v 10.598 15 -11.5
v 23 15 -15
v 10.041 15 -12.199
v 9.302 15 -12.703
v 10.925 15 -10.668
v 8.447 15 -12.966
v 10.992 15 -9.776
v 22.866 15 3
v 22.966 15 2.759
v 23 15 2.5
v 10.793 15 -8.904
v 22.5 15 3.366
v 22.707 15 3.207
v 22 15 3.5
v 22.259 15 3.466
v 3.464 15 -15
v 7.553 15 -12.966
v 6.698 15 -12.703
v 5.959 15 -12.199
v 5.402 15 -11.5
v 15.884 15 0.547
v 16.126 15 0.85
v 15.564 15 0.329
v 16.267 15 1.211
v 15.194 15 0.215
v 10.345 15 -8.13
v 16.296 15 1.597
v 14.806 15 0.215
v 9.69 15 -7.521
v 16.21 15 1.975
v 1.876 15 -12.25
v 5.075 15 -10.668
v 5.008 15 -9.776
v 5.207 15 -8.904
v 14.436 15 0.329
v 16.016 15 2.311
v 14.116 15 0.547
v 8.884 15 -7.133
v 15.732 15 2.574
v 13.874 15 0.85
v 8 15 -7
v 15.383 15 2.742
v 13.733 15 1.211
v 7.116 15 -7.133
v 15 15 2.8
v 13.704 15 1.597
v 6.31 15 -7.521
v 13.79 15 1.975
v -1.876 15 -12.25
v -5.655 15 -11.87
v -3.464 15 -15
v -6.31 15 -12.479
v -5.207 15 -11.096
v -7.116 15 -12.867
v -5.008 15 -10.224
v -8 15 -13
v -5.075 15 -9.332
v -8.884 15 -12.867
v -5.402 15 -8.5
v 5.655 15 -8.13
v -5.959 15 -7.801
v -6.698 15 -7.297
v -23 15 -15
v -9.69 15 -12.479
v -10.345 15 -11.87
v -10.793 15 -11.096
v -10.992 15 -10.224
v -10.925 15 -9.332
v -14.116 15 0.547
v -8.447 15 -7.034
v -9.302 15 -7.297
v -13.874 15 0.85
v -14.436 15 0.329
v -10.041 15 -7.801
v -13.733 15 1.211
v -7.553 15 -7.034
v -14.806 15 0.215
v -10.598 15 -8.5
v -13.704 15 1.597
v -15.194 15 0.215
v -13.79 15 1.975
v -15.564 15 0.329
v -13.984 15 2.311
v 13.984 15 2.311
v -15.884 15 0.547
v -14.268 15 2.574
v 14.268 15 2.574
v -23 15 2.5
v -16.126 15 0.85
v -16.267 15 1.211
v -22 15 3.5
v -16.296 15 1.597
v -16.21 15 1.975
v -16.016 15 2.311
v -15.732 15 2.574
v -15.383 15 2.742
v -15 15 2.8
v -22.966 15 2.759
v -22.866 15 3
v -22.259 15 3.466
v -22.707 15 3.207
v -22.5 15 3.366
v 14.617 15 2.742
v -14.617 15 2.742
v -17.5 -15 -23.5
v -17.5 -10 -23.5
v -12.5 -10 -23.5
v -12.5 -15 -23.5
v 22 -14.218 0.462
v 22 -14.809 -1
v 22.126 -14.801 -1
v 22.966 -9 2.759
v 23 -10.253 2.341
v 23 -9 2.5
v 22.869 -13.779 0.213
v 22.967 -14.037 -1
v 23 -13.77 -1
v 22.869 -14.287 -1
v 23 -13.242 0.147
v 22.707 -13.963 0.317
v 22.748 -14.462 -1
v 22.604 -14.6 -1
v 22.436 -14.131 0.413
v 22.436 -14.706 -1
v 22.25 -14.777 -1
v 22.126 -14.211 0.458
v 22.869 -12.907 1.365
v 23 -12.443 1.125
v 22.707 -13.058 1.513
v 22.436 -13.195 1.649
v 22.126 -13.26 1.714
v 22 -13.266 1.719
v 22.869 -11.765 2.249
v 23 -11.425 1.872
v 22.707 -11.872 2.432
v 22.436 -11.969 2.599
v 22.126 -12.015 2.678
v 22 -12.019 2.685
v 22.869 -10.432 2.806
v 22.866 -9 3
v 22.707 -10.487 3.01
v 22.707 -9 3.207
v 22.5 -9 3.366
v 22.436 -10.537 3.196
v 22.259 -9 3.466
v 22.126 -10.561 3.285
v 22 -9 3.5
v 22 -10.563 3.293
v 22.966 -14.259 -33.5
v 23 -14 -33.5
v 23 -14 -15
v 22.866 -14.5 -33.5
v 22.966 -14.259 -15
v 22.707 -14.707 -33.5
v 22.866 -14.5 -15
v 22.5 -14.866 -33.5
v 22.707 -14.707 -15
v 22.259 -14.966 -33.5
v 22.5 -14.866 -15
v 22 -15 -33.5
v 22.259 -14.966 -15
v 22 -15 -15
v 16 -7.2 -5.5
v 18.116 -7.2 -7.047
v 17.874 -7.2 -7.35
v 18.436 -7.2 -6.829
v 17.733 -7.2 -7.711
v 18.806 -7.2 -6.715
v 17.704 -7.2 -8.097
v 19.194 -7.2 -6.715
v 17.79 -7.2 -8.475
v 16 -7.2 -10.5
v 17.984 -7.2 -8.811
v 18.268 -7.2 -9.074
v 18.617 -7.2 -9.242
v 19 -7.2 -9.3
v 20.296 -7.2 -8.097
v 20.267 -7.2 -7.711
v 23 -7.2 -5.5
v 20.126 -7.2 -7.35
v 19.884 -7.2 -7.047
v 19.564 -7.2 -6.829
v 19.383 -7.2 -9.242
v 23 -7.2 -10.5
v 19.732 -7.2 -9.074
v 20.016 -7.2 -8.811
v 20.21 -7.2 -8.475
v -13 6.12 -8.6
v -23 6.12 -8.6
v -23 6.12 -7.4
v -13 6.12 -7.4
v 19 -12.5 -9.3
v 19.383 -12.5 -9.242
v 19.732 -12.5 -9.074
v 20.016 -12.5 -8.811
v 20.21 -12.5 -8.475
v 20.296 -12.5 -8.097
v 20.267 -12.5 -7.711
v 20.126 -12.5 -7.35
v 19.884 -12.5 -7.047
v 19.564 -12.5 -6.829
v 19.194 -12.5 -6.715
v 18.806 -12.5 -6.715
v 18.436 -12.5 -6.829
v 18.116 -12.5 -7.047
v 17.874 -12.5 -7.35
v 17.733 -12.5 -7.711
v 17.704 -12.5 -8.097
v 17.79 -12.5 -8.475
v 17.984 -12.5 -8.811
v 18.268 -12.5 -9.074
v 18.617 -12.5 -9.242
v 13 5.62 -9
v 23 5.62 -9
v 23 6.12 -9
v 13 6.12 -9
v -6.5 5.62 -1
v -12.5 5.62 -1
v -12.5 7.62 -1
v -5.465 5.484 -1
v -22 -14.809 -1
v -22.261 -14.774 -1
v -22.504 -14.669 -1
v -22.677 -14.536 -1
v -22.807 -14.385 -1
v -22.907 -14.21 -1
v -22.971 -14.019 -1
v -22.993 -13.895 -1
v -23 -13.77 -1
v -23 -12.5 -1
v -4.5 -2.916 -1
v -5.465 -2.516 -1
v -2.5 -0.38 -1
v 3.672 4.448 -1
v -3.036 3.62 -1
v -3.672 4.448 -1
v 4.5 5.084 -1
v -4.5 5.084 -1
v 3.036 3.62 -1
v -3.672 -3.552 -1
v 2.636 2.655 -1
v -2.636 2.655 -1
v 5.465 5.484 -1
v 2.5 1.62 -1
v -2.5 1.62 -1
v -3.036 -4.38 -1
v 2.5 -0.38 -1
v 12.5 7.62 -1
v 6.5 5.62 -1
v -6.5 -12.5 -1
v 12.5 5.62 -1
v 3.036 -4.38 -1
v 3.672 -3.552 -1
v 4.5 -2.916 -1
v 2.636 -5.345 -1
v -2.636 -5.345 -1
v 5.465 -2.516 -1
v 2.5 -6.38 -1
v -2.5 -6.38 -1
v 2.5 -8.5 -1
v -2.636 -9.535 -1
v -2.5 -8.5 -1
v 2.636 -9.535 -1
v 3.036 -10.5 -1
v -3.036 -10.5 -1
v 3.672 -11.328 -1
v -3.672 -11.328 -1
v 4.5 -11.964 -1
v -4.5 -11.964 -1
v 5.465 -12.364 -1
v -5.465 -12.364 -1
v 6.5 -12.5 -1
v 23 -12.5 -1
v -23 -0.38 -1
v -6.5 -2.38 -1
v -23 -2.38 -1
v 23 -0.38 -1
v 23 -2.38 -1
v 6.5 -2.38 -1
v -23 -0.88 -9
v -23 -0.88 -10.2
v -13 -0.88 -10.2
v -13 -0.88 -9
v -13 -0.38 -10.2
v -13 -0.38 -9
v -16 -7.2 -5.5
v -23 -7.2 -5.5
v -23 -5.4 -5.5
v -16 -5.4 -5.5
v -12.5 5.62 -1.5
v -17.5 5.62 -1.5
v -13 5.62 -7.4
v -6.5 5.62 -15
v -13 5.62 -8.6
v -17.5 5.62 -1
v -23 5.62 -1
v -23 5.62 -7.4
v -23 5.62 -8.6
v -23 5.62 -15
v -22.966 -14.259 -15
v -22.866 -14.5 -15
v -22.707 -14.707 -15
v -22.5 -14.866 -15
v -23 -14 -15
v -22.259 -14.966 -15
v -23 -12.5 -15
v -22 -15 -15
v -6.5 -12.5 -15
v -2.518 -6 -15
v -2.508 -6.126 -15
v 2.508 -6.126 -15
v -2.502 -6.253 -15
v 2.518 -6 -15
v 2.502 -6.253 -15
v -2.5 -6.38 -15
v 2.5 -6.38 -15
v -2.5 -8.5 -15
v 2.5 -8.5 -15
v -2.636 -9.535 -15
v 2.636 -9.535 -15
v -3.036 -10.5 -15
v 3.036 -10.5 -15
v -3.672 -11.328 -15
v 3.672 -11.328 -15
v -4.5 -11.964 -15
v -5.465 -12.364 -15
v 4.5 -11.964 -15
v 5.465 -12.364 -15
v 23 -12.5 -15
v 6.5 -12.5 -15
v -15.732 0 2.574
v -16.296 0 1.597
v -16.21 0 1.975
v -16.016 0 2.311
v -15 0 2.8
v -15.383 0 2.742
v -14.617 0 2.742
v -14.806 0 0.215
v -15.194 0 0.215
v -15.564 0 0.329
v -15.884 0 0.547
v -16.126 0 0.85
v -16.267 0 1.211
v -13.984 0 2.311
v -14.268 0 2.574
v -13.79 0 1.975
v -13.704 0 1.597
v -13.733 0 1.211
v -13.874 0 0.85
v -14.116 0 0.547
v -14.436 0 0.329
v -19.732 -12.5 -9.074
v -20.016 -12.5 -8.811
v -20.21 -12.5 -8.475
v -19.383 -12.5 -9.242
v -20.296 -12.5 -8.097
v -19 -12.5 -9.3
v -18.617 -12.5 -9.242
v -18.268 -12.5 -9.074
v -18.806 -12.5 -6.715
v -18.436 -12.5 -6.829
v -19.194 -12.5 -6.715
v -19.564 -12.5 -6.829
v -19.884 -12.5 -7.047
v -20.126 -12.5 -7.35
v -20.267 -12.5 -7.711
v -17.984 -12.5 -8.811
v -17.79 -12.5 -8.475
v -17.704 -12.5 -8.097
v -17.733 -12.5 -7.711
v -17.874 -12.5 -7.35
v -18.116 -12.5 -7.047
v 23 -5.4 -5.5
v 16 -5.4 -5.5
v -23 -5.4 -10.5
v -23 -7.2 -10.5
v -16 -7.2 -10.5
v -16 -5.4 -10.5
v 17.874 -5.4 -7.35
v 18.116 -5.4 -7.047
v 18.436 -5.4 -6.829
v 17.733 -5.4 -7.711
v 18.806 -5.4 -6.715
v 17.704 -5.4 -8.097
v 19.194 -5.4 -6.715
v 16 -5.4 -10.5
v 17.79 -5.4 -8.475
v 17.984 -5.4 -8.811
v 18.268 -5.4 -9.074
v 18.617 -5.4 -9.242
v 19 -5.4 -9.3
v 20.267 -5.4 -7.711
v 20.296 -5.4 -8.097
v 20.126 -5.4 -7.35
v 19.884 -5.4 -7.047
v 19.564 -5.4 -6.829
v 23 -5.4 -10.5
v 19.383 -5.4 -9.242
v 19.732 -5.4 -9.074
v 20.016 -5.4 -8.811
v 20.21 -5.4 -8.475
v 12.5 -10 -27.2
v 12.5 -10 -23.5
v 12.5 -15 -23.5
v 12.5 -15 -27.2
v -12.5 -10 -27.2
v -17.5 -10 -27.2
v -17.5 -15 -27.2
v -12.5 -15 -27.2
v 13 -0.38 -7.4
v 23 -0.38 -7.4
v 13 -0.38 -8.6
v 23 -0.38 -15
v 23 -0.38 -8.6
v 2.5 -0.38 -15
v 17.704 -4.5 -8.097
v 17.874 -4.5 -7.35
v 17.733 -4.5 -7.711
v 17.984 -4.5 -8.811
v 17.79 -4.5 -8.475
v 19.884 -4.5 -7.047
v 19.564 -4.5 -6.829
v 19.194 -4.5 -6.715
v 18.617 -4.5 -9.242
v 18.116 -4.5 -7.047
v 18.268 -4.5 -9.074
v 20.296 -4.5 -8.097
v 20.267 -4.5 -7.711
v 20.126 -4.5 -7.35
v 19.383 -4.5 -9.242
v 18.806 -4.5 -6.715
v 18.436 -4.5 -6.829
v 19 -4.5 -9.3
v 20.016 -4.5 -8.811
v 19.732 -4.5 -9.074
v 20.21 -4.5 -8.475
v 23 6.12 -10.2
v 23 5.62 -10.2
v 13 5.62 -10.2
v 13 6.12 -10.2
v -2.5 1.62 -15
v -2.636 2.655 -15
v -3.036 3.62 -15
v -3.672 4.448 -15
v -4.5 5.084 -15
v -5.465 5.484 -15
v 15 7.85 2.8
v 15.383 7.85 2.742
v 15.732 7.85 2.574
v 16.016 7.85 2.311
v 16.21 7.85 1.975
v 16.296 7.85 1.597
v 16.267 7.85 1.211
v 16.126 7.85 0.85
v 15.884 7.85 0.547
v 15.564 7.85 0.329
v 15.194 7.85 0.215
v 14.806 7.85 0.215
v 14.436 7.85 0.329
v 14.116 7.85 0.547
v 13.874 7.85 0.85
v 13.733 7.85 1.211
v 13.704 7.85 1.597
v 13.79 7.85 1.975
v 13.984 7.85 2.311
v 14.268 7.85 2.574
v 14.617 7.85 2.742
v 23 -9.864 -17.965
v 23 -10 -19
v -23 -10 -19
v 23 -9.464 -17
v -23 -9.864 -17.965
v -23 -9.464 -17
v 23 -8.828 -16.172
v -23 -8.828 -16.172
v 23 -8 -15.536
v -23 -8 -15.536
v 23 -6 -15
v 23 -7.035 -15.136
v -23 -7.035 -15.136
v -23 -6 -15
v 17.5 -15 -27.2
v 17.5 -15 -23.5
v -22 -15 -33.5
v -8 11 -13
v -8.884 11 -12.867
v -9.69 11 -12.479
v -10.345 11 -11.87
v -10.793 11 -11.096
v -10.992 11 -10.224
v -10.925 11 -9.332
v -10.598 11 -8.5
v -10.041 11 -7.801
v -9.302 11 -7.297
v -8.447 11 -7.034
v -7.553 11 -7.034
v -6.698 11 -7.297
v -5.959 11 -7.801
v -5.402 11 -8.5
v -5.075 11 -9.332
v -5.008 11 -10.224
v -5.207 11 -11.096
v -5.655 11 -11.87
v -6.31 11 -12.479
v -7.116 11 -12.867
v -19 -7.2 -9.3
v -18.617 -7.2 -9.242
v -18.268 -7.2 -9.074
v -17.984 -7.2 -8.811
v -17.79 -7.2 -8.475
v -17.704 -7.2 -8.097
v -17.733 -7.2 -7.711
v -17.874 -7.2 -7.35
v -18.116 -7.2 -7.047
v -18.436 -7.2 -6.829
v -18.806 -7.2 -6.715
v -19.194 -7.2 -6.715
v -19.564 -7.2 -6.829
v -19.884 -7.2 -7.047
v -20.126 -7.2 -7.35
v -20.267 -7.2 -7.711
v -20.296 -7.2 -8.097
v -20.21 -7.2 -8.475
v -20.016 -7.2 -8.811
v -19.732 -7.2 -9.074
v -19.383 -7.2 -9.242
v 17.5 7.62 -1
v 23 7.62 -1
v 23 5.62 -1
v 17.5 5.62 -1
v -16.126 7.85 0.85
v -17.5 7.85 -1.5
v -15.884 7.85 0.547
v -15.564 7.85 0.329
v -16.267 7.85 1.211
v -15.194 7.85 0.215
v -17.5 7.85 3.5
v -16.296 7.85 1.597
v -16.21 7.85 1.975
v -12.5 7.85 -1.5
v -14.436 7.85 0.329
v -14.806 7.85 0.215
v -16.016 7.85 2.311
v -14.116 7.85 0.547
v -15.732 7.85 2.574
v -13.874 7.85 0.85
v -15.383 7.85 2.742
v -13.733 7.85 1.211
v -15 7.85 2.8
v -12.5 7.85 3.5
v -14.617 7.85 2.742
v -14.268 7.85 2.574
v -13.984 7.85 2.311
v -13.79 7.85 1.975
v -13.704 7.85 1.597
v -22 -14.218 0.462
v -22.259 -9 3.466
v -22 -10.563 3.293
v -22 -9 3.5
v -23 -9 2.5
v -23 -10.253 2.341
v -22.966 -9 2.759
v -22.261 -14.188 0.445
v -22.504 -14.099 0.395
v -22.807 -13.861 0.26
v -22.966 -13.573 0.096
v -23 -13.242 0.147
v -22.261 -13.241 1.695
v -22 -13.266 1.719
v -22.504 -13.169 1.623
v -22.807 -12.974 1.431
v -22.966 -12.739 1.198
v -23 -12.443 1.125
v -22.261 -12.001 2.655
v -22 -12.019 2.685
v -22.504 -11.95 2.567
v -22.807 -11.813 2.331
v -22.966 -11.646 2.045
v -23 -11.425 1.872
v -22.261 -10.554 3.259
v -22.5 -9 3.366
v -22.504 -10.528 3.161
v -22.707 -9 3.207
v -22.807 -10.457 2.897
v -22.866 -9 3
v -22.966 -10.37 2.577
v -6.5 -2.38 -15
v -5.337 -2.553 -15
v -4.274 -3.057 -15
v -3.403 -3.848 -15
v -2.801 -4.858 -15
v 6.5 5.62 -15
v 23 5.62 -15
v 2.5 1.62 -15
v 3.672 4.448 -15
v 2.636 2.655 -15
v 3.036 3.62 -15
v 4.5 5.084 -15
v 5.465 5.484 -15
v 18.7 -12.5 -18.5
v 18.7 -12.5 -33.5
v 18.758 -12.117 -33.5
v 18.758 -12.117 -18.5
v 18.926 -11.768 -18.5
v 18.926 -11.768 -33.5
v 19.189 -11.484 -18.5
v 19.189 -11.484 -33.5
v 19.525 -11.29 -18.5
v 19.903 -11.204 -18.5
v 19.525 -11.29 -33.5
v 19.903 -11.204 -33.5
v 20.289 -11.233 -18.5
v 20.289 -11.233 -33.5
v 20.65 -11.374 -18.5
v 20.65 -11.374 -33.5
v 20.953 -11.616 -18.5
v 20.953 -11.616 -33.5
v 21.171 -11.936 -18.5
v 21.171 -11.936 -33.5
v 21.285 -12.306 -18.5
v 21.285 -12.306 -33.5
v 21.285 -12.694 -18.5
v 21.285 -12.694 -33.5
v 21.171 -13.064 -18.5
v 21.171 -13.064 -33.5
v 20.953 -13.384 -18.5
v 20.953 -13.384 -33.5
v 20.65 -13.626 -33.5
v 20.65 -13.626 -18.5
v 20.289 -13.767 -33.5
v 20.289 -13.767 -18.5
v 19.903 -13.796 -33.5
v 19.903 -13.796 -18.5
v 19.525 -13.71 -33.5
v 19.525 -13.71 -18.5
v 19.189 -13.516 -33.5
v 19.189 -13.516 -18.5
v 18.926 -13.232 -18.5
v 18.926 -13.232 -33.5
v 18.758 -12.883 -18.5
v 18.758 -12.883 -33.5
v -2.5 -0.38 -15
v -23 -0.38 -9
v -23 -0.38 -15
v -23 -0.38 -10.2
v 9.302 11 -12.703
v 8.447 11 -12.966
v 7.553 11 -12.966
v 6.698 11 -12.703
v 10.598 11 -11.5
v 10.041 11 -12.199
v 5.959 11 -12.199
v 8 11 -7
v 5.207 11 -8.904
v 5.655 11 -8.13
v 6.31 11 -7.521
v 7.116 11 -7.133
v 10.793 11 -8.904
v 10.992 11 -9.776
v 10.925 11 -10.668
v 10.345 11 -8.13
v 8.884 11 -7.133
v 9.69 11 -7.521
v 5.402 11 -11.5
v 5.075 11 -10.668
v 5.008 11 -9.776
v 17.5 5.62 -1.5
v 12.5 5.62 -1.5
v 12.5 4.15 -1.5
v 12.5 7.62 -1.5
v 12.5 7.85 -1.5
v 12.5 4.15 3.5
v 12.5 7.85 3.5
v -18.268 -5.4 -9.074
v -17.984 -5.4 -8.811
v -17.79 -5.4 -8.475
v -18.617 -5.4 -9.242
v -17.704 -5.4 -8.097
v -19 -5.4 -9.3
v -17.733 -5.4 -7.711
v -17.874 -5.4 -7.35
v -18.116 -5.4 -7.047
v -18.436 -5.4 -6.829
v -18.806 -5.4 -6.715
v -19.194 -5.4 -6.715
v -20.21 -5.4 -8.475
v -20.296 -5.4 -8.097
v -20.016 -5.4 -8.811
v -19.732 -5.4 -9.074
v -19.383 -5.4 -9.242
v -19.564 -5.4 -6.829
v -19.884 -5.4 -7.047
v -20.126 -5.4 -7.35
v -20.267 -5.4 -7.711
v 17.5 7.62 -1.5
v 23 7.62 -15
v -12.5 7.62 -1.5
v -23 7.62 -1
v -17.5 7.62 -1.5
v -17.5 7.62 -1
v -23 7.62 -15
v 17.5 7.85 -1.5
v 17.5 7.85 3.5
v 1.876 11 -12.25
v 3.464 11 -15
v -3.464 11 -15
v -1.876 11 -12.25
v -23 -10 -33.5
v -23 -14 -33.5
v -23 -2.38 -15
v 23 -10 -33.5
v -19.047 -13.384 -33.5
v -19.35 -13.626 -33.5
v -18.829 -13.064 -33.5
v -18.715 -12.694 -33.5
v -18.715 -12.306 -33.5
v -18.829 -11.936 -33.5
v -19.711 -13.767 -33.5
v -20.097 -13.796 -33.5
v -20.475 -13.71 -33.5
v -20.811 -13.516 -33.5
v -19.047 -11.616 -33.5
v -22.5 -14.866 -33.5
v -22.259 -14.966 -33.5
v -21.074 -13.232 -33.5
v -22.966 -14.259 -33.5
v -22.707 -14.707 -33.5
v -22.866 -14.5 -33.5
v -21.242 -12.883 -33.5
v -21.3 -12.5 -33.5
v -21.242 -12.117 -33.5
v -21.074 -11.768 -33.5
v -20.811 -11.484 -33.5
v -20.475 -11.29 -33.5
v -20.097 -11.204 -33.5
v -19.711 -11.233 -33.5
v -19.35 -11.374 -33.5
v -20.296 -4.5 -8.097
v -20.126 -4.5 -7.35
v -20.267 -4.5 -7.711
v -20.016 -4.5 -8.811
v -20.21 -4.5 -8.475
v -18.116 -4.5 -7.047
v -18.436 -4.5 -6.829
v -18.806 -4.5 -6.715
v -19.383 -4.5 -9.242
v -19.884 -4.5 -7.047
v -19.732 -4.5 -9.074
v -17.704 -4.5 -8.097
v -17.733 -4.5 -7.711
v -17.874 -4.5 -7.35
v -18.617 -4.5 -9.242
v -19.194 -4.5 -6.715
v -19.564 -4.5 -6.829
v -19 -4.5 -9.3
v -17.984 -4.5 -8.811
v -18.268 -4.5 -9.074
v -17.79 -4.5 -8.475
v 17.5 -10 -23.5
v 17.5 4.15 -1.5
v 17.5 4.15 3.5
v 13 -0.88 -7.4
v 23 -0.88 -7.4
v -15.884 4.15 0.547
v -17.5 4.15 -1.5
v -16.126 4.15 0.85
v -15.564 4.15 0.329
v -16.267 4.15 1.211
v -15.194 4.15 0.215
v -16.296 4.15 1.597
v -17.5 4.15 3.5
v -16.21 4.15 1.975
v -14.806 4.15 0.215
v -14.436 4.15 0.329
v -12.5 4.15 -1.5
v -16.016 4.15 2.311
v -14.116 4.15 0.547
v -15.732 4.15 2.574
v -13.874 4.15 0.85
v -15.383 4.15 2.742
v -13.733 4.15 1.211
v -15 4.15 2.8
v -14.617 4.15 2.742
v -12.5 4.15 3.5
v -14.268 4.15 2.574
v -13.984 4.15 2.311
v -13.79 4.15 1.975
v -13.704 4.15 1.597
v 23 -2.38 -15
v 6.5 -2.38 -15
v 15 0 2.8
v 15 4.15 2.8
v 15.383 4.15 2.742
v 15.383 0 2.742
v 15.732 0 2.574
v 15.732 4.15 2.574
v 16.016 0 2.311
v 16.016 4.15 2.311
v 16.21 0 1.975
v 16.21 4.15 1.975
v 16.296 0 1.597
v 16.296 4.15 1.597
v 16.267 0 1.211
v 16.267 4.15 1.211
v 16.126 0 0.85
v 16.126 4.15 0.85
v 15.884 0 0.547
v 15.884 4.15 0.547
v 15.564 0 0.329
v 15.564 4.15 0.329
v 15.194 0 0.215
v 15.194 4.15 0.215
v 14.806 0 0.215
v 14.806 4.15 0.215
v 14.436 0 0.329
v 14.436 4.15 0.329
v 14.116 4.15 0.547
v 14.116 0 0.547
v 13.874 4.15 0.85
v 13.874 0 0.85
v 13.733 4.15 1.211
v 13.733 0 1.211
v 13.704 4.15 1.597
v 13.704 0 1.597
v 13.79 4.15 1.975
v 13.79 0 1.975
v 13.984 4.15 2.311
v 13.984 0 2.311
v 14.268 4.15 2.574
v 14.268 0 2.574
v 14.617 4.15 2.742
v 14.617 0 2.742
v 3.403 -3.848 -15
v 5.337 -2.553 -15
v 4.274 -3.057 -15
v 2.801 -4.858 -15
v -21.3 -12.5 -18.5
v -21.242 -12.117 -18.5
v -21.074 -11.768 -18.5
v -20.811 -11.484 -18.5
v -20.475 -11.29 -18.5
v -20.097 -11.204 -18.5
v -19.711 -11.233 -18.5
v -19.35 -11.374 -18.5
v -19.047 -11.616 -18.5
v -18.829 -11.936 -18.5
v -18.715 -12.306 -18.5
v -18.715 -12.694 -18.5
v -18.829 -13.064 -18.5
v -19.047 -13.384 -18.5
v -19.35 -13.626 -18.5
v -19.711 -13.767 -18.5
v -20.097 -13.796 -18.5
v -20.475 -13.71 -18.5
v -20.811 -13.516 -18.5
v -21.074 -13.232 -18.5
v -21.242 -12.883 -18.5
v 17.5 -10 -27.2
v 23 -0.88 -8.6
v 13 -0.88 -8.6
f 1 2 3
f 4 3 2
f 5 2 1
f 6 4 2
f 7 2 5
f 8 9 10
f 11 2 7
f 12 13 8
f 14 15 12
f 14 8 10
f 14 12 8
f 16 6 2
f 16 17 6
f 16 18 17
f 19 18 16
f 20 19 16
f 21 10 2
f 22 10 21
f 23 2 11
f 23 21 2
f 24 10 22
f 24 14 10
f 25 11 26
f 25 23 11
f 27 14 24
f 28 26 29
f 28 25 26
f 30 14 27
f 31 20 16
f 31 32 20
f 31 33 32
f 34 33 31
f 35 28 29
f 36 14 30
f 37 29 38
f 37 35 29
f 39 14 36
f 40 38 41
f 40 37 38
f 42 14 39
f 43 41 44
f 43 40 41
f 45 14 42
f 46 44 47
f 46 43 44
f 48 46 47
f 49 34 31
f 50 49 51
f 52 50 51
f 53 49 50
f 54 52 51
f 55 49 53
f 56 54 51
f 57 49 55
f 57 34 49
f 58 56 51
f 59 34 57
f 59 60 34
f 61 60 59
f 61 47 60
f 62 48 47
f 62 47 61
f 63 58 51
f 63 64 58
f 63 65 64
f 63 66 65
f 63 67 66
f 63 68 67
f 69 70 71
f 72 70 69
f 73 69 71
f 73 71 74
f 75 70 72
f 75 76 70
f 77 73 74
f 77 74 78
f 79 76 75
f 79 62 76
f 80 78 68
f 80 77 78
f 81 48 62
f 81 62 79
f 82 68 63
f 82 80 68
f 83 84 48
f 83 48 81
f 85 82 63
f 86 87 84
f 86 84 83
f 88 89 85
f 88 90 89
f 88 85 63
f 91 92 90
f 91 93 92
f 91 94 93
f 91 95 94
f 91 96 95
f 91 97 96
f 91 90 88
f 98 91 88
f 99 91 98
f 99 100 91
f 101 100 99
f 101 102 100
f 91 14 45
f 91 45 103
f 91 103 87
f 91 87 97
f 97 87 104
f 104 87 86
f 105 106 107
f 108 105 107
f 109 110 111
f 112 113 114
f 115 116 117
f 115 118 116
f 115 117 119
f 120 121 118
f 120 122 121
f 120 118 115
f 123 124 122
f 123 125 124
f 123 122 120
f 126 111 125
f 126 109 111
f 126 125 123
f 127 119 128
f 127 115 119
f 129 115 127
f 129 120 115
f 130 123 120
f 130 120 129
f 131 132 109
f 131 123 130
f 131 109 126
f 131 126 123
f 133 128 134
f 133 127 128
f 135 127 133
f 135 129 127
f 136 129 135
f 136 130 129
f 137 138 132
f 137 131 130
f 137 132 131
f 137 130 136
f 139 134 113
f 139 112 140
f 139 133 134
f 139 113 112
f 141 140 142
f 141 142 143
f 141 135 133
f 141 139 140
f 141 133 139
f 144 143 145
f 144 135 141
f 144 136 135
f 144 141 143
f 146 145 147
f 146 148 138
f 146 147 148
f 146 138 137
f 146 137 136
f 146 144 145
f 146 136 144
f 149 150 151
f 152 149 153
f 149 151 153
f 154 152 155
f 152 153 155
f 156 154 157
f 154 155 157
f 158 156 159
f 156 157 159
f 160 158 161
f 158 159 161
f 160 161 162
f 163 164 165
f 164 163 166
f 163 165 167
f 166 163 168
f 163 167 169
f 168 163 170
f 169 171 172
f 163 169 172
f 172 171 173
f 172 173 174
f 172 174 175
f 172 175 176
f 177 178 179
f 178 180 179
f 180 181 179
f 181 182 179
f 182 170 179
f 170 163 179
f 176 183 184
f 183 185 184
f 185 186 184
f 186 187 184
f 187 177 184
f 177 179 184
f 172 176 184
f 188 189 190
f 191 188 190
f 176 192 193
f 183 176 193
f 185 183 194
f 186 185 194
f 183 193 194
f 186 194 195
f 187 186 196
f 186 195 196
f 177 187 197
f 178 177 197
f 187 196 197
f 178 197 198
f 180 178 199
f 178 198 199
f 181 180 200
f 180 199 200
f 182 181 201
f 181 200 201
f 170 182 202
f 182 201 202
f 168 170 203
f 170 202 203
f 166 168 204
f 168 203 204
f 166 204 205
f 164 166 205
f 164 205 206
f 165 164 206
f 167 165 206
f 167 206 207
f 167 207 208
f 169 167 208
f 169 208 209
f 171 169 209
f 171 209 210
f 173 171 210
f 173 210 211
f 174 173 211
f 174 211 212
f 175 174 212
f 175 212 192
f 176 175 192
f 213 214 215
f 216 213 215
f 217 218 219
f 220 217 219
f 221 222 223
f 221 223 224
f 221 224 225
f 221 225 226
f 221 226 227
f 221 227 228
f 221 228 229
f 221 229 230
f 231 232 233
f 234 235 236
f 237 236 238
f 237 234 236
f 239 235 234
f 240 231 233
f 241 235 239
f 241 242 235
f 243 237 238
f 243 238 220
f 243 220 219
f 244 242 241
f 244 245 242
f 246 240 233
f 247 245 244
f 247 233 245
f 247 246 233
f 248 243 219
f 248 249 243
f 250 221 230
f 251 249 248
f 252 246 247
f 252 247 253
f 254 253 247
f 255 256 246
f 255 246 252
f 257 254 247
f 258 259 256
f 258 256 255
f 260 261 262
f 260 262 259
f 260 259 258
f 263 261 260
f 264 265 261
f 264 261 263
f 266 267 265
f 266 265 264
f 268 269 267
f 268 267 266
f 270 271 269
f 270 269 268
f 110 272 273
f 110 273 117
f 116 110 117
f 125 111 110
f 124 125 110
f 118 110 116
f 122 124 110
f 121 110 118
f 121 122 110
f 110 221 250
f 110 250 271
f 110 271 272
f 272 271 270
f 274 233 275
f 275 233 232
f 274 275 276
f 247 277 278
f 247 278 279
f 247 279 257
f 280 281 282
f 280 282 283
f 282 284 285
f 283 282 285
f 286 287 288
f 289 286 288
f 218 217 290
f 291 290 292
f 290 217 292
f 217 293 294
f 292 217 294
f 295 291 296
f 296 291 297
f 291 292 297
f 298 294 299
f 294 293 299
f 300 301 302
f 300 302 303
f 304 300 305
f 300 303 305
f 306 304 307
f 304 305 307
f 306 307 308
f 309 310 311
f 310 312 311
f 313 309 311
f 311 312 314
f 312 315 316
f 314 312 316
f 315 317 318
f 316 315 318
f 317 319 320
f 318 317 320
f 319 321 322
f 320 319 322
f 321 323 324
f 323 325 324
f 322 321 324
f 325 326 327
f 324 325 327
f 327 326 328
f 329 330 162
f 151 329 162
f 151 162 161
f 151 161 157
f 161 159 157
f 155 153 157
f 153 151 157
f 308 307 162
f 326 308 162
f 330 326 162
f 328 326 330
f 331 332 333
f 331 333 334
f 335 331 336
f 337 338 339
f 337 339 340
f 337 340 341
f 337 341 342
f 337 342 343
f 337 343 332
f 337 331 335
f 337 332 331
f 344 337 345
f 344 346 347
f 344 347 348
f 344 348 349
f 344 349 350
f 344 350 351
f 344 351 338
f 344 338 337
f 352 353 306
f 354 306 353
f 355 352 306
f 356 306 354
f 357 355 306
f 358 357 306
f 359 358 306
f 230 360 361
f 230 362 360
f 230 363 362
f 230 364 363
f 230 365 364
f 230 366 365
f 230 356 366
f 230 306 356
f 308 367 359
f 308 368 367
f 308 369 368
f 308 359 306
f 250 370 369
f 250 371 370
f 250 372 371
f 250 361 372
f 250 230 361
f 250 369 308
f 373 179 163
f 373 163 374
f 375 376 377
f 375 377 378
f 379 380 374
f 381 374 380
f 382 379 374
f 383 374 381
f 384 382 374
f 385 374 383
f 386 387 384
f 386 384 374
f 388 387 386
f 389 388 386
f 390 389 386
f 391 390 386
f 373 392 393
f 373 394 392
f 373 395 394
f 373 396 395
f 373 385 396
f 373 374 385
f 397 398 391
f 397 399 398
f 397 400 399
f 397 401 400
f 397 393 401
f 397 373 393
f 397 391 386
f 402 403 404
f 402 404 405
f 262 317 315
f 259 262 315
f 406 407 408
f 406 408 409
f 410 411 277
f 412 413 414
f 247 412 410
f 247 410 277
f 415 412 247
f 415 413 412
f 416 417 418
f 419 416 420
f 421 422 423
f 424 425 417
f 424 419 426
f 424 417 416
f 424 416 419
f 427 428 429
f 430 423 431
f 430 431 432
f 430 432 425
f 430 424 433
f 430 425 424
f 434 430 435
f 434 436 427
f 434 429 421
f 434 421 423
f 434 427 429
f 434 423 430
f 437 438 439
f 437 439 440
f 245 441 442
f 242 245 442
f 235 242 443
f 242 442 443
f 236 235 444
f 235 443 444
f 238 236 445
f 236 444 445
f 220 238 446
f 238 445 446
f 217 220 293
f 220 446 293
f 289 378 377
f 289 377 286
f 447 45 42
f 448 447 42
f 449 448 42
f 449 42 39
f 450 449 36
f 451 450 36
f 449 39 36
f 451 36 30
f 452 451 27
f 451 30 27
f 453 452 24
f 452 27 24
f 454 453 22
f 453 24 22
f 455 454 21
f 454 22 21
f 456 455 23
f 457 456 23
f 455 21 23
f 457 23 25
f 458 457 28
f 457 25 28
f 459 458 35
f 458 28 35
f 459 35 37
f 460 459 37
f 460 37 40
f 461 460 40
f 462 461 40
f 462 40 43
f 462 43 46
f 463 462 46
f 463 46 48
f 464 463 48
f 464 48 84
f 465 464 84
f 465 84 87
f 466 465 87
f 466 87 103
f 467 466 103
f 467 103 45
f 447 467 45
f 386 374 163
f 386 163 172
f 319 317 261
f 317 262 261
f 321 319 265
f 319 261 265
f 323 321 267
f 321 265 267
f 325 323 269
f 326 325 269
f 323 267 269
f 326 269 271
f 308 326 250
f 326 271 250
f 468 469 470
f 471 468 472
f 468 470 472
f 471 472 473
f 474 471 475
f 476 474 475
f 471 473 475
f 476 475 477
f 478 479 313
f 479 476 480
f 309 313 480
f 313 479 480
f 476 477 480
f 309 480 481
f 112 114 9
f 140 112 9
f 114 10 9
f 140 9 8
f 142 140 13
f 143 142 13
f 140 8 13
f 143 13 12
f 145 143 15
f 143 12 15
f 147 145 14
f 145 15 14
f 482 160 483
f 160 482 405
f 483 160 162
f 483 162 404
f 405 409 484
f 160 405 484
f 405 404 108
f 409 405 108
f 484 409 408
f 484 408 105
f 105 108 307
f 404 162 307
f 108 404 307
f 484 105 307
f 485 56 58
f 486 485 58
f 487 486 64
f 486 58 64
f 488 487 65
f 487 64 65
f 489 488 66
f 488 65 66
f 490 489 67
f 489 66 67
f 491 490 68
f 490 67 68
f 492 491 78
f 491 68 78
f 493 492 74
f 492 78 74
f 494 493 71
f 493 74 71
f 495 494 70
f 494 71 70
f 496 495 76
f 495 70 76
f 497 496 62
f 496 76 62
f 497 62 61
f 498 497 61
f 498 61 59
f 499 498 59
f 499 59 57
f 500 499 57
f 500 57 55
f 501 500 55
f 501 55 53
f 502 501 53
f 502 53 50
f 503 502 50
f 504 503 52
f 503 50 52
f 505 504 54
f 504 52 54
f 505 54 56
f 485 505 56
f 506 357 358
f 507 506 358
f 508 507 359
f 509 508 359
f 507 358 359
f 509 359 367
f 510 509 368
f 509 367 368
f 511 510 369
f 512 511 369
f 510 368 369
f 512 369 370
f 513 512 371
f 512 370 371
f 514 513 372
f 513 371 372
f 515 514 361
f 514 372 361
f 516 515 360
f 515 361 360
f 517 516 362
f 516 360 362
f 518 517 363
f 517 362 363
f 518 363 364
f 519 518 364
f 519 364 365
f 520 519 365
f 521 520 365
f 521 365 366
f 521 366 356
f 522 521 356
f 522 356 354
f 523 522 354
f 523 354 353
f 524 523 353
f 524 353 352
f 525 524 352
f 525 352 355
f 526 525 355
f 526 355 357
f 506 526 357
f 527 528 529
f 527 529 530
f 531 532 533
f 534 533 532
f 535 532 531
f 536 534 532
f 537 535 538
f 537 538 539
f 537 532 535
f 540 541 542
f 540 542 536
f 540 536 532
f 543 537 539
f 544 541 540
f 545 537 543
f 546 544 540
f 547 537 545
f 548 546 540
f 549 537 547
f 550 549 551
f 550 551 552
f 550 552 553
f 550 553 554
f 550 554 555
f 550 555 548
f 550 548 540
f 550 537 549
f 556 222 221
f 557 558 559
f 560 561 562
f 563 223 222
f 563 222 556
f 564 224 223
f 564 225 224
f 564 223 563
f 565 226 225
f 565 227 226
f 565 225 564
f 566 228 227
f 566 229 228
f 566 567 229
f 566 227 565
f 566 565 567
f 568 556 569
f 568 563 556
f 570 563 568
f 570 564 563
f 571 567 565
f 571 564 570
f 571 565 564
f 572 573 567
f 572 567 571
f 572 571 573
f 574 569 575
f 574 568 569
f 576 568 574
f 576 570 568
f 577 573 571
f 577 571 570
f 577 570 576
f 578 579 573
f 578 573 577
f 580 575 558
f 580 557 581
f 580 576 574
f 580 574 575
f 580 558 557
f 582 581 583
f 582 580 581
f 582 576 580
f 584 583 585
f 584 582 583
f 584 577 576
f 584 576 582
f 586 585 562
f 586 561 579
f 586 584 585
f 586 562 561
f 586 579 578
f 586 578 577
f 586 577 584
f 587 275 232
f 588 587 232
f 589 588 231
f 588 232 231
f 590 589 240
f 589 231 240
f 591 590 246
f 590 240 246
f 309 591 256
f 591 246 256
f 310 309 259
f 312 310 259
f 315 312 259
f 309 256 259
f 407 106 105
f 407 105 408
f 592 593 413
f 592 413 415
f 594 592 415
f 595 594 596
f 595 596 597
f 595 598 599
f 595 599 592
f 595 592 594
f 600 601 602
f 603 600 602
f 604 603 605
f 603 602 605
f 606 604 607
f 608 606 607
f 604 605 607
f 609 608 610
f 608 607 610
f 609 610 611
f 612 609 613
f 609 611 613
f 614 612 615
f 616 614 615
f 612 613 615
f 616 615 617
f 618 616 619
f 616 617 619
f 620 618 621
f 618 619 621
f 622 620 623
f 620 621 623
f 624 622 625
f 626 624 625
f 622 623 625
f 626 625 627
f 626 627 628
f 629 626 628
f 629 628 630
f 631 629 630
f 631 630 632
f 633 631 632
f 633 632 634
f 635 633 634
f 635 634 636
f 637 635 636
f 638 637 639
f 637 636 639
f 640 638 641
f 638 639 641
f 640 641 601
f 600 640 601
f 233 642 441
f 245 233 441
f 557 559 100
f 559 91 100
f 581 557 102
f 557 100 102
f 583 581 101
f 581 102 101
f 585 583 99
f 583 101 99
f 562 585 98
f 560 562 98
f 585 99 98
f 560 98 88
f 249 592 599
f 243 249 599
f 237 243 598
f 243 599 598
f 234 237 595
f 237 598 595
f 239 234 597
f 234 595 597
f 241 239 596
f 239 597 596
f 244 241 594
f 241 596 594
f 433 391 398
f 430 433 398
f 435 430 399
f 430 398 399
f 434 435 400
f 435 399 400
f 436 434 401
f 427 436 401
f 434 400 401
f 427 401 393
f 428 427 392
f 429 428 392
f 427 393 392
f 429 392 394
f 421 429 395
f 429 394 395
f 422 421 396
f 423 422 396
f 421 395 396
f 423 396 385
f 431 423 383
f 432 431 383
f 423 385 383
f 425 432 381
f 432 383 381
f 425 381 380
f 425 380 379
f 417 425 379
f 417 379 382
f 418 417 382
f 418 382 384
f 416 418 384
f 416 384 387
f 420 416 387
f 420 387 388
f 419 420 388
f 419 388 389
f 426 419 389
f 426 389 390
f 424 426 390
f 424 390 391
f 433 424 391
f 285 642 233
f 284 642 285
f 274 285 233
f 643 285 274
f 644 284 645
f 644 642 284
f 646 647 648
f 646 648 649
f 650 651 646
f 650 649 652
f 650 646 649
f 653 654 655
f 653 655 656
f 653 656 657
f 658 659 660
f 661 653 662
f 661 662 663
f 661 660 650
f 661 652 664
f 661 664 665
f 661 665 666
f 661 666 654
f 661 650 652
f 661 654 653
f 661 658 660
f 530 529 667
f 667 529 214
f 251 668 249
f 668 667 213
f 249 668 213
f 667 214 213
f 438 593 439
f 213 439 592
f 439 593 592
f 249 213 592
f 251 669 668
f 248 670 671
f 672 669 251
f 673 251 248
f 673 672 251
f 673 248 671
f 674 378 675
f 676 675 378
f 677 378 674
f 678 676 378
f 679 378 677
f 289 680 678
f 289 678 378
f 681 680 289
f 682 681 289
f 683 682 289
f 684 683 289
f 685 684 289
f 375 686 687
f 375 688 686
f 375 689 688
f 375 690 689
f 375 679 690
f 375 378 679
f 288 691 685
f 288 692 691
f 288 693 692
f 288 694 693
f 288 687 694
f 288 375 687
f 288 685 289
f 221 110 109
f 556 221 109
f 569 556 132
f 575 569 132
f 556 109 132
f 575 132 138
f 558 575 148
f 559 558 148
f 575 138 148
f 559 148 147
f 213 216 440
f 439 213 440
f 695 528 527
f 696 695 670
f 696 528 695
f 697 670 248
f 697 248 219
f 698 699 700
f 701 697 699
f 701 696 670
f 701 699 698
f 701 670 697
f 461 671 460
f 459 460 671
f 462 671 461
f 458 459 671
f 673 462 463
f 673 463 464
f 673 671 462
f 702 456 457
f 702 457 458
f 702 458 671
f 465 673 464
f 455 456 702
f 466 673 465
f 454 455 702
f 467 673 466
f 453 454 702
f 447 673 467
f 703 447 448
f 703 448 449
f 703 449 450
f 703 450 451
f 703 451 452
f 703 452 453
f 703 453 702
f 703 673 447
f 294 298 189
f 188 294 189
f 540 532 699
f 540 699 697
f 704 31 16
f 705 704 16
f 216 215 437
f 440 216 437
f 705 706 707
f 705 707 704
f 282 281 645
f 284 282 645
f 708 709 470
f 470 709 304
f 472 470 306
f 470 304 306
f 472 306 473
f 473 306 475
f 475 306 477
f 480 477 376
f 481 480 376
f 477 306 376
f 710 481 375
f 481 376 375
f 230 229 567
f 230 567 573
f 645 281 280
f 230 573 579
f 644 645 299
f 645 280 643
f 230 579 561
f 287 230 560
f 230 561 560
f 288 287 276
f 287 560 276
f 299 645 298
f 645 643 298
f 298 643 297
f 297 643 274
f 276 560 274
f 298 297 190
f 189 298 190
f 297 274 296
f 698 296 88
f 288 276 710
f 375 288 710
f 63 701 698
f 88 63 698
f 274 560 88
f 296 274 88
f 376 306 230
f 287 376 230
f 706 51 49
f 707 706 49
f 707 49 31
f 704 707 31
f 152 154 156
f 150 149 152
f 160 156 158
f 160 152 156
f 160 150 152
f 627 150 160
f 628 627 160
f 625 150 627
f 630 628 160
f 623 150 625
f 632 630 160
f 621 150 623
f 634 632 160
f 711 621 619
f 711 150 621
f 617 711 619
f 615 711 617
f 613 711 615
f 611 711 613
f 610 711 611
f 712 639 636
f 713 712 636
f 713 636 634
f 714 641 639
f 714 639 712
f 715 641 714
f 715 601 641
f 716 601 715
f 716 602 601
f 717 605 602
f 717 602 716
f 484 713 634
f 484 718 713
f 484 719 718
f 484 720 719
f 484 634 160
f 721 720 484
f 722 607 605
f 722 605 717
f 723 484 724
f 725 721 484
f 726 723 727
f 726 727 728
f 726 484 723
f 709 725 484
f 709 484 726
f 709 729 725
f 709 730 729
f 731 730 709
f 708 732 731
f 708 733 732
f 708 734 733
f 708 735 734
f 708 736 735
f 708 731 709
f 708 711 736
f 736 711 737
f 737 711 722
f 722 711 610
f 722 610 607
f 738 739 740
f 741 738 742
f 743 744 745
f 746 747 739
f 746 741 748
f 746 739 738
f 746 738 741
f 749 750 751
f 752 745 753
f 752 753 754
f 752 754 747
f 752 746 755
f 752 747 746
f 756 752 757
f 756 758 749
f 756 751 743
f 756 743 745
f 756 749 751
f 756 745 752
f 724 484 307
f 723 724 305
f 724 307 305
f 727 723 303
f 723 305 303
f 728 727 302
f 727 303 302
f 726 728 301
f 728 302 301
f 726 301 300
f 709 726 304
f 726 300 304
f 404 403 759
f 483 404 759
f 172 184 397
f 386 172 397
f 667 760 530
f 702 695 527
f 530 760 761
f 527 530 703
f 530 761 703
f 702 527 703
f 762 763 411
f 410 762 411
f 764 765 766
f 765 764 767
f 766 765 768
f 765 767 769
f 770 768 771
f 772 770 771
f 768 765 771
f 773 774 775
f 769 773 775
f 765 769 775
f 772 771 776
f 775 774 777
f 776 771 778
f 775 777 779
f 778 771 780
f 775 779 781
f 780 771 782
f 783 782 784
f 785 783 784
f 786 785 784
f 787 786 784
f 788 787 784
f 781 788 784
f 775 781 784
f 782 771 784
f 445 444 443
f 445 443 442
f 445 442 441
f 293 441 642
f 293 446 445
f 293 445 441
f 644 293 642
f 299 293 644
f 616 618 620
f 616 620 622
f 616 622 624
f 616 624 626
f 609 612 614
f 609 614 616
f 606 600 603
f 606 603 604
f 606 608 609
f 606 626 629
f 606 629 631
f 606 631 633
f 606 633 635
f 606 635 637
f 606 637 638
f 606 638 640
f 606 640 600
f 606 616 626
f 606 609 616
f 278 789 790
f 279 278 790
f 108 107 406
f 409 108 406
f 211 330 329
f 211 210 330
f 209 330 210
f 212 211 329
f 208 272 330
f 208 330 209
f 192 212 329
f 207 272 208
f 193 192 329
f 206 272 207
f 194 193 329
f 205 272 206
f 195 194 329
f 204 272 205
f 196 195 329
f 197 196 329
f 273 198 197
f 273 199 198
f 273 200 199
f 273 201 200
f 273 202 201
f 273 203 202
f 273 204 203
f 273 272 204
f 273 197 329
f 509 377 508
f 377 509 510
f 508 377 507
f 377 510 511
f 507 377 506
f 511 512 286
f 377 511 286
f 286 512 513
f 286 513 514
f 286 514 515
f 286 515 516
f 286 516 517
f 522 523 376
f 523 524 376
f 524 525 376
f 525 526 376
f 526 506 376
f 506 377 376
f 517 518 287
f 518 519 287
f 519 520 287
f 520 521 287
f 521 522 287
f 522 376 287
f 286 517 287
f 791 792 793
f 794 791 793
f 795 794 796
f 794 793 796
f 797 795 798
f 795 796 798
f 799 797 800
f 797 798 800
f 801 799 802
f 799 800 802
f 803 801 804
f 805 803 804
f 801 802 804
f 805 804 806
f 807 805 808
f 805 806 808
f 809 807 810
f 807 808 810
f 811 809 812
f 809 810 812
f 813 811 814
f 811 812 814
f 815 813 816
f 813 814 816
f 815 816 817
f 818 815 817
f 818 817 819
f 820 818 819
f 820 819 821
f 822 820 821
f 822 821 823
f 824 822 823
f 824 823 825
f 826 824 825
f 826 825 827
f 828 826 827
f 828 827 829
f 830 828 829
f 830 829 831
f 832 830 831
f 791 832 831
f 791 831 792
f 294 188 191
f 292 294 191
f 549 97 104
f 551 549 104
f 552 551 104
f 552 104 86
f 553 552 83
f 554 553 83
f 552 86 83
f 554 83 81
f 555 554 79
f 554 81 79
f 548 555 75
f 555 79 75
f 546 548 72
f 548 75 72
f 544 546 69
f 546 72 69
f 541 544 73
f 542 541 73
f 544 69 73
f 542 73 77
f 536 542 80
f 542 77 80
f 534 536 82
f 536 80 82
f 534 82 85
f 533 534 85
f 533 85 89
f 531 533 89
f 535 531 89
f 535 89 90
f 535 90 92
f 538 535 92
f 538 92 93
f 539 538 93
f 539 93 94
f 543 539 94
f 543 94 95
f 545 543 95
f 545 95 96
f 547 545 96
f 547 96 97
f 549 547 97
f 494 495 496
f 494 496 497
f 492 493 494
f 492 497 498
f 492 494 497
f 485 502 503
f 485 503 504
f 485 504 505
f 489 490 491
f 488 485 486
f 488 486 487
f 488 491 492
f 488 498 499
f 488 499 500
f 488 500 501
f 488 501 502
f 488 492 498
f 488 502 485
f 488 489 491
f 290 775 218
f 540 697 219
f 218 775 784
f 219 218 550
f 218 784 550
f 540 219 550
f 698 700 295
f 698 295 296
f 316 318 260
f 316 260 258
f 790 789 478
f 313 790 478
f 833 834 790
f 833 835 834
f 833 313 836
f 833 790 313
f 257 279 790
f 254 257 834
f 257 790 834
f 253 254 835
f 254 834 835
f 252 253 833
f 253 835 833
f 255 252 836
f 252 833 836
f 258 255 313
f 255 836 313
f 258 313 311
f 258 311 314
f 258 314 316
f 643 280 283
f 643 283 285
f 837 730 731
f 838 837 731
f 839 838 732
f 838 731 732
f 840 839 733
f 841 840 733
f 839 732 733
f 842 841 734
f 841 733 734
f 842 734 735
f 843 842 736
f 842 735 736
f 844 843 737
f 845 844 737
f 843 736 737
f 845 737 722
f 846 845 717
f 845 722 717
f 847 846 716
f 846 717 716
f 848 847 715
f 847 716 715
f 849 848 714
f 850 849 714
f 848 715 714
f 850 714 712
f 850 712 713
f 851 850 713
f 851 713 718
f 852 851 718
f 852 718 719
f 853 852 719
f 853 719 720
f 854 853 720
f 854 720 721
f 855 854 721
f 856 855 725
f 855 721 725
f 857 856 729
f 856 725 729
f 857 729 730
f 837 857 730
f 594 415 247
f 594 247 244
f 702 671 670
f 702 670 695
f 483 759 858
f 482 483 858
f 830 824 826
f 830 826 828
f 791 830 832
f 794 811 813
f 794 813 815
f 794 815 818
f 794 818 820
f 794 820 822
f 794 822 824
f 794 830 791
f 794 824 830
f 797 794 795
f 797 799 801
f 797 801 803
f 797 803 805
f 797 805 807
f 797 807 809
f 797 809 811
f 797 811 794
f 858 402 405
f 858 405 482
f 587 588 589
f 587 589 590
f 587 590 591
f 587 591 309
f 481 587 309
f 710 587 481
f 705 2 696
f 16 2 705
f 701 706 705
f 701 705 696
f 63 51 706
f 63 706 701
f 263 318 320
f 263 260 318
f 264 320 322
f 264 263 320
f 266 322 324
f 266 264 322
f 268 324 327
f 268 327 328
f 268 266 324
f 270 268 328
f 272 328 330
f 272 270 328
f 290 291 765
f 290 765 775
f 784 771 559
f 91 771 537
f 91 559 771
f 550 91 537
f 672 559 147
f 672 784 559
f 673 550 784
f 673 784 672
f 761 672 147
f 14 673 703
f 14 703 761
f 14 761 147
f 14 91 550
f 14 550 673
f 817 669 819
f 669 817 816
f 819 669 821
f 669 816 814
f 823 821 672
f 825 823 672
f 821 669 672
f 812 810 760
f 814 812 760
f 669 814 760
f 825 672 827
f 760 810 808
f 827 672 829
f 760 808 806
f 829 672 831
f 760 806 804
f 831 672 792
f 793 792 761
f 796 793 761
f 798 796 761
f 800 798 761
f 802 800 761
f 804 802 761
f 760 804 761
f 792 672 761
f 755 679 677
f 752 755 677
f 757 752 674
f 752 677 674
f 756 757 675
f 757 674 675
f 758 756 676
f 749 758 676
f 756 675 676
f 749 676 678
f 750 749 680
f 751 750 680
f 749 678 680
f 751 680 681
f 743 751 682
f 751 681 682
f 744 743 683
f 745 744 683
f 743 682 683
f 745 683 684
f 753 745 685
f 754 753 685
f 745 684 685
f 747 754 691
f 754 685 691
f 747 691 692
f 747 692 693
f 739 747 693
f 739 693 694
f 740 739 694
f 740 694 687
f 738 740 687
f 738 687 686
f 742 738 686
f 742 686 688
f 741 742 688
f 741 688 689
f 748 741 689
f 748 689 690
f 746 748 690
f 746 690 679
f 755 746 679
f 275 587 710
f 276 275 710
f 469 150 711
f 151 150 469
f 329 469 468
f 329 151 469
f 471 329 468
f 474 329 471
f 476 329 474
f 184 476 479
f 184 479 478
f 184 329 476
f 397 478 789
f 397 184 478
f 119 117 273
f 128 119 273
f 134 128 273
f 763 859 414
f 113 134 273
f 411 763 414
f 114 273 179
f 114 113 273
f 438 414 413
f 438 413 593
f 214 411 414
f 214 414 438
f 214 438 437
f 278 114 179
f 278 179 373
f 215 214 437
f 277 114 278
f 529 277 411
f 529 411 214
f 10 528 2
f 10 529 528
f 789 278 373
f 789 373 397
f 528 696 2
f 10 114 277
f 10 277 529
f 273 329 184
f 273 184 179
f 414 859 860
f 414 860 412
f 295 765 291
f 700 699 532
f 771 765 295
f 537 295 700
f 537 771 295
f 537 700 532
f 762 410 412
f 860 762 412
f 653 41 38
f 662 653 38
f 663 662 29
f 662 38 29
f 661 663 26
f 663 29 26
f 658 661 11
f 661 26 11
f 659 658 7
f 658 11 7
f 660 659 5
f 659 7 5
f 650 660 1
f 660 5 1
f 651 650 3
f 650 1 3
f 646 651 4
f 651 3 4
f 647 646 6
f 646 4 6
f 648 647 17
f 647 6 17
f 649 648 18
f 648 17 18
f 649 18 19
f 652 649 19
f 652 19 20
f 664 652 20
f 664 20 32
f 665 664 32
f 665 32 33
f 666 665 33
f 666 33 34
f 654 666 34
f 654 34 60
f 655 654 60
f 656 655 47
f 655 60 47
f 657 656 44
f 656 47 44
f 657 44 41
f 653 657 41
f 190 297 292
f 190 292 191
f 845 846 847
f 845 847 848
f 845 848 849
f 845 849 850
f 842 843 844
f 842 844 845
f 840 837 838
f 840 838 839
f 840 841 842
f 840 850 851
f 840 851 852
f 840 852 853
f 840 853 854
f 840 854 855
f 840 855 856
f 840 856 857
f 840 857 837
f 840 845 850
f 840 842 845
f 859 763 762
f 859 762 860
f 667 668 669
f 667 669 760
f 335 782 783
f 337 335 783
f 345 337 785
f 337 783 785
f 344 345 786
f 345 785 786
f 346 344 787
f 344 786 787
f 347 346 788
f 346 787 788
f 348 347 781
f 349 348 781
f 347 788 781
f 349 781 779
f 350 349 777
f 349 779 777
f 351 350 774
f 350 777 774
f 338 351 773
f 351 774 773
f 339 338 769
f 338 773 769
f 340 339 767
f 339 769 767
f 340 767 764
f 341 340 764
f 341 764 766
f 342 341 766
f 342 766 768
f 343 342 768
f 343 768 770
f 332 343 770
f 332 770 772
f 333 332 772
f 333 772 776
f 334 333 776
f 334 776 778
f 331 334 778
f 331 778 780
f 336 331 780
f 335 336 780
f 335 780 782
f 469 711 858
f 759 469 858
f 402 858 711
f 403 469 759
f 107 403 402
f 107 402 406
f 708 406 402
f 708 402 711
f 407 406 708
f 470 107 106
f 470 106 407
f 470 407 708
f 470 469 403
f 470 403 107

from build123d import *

# Parameters (mm, degrees)
SKETCH_1_W           = 46
SKETCH_1_H           = 30
EXTRUDE_1_DEPTH      = 3.5
SKETCH_2_W           = 46
SKETCH_2_H           = 5
EXTRUDE_2_DEPTH      = 33.5
SKETCH_4_R           = 1.3
CUT_EXTRUDE_2_DEPTH  = 15
SKETCH_5_R           = 1.3
CUT_EXTRUDE_3_DEPTH  = 15
CUT_EXTRUDE_4_REACH  = 49.71
SKETCH_6_W           = 5
SKETCH_6_H           = 3.7
SKETCH_7_W           = 46
SKETCH_7_H           = 25
EXTRUDE_3_DEPTH      = 15
SKETCH_8_W           = 46
SKETCH_8_H           = 2
CUT_EXTRUDE_5_DEPTH  = 14
SKETCH_10_W          = 5
SKETCH_10_H          = 3.7
CUT_EXTRUDE_7_DEPTH  = 5
FILLET_1_R           = 6
FILLET_2_R           = 4
SKETCH_11_W          = 5
SKETCH_11_H          = 23.135705429
CUT_EXTRUDE_8_DEPTH  = 14
FILLET_3_R           = 4
FILLET_4_R           = 1
SKETCH_12_W          = 1.2
SKETCH_12_H          = 0.5
EXTRUDE_4_DEPTH      = 10
SKETCH_13_W          = 1.2
SKETCH_13_H          = 0.5
EXTRUDE_5_DEPTH      = 10
SKETCH_14_W          = 57.080352076
SKETCH_14_H          = 14
CUT_EXTRUDE_9_DEPTH  = 2.5
FILLET_5_R           = 4
SKETCH_15_R          = 1.3
CUT_EXTRUDE_10_DEPTH = 8
SKETCH_16_W          = 5
SKETCH_16_H          = 1.8
CUT_EXTRUDE_11_DEPTH = 7
SKETCH_17_W          = 5
SKETCH_17_H          = 1.8
CUT_EXTRUDE_12_DEPTH = 7
SKETCH_18_R          = 3
CUT_EXTRUDE_13_DEPTH = 4


with BuildPart() as part:
    # Эскиз1 → Бобышка-Вытянуть1 (new body)
    with BuildSketch(Plane.XY):
        Rectangle(SKETCH_1_W, SKETCH_1_H)
    extrude(amount=EXTRUDE_1_DEPTH)

    # Эскиз2 → Бобышка-Вытянуть2 (add)
    with BuildSketch(Plane(origin=(0, 0, 0), x_dir=(-1, 0, 0), z_dir=(0, 0, -1))):
        with Locations((0, -12.5)):
            Rectangle(SKETCH_2_W, SKETCH_2_H)
    extrude(amount=EXTRUDE_2_DEPTH)

    # Эскиз4 → Вырез-Вытянуть2 (cut)
    with BuildSketch(Plane(origin=(0, 15, 0), x_dir=(1, 0, 0), z_dir=(0, 1, 0))):
        with Locations(Location((15, -1.5, 0), (0, 0, 270))):
            Circle(SKETCH_4_R)
        with Locations(Location((-15, -1.5, 0), (0, 0, 270))):
            Circle(SKETCH_4_R)
    extrude(amount=-CUT_EXTRUDE_2_DEPTH, mode=Mode.SUBTRACT)

    # Эскиз5 → Вырез-Вытянуть3 (cut)
    with BuildSketch(Plane(origin=(0, 0, -33.5), x_dir=(-1, 0, 0), z_dir=(0, 0, -1))):
        with Locations((-20, -12.5)):
            Circle(SKETCH_5_R)
        with Locations((20, -12.5)):
            Circle(SKETCH_5_R)
    extrude(amount=-CUT_EXTRUDE_3_DEPTH, mode=Mode.SUBTRACT)

    # Эскиз6 → Вырез-Вытянуть4 (cut, up to next)
    with BuildSketch(Plane(origin=(0, -10, 0), x_dir=(1, 0, 0), z_dir=(0, 1, 0)), mode=Mode.PRIVATE) as cut_extrude_4_sk1:
        with Locations((-15, 25.35)):
            Rectangle(SKETCH_6_W, SKETCH_6_H)
    cut_extrude_4_tool1 = extrude(cut_extrude_4_sk1.sketch, amount=-CUT_EXTRUDE_4_REACH, mode=Mode.PRIVATE) & part.part
    # Эскиз6 → Вырез-Вытянуть4 (cut, up to next)
    with BuildSketch(Plane(origin=(0, -10, 0), x_dir=(1, 0, 0), z_dir=(0, 1, 0)), mode=Mode.PRIVATE) as cut_extrude_4_sk2:
        with Locations((15, 25.35)):
            Rectangle(SKETCH_6_W, SKETCH_6_H)
    cut_extrude_4_tool2 = extrude(cut_extrude_4_sk2.sketch, amount=-CUT_EXTRUDE_4_REACH, mode=Mode.PRIVATE) & part.part
    add(cut_extrude_4_tool1.solids().sort_by_distance((-15, -10, -25.35))[0], mode=Mode.SUBTRACT)
    add(cut_extrude_4_tool2.solids().sort_by_distance((15, -10, -25.35))[0], mode=Mode.SUBTRACT)

    # Эскиз7 → Бобышка-Вытянуть3 (add)
    with BuildSketch(Plane(origin=(0, 0, 0), x_dir=(-1, 0, 0), z_dir=(0, 0, -1))):
        with Locations((0, 2.5)):
            Rectangle(SKETCH_7_W, SKETCH_7_H)
    extrude(amount=EXTRUDE_3_DEPTH)

    # Эскиз8 → Вырез-Вытянуть5 (cut)
    with BuildSketch(Plane(origin=(0, 0, -15), x_dir=(-1, 0, 0), z_dir=(0, 0, -1))):
        with Locations((0, 6.62)):
            Rectangle(SKETCH_8_W, SKETCH_8_H)
        with Locations((0, -1.38)):
            Rectangle(SKETCH_8_W, SKETCH_8_H)
    extrude(amount=-CUT_EXTRUDE_5_DEPTH, mode=Mode.SUBTRACT)

    # Эскиз10 → Вырез-Вытянуть7 (cut)
    with BuildSketch(Plane.XY.offset(3.5)):
        with Locations((15, 6)):
            Rectangle(SKETCH_10_W, SKETCH_10_H)
        with Locations((-15, 6)):
            Rectangle(SKETCH_10_W, SKETCH_10_H)
    extrude(amount=-CUT_EXTRUDE_7_DEPTH, mode=Mode.SUBTRACT)

    # Скругление1
    fillet_1_edges = [part.edges().sort_by_distance(p)[0] for p in [
        (0, -15, 3.5),
    ]]
    fillet(fillet_1_edges, radius=FILLET_1_R)

    # Скругление2
    fillet_2_edges = [part.edges().sort_by_distance(p)[0] for p in [
        (0, -10, -15),
    ]]
    fillet(fillet_2_edges, radius=FILLET_2_R)

    # Эскиз11 → Вырез-Вытянуть8 (cut)
    with BuildSketch(Plane(origin=(0, 0, -15), x_dir=(-1, 0, 0), z_dir=(0, 0, -1))):
        with Locations((0, -5.947852714)):
            Rectangle(SKETCH_11_W, SKETCH_11_H)
    extrude(amount=-CUT_EXTRUDE_8_DEPTH, mode=Mode.SUBTRACT)

    # Скругление3
    # the kernel refuses this fillet: 4 mm, written as the material it takes off along each edge
    with BuildSketch(Plane(origin=(-2.5, 5.62, -25), x_dir=(-1, 0, 0), z_dir=(0, 0, 1))) as fillet_3_piece_1:
        with BuildLine():
            CenterArc((FILLET_3_R, FILLET_3_R), FILLET_3_R, 180, 90)
            Line((0, FILLET_3_R), (0, 0))
            Line((0, 0), (FILLET_3_R, 0))
        make_face()
    extrude(amount=24, mode=Mode.SUBTRACT)
    with BuildSketch(Plane(origin=(-2.5, -2.38, -1), x_dir=(-1, 0, 0), z_dir=(0, 0, -1))) as fillet_3_piece_2:
        with BuildLine():
            CenterArc((FILLET_3_R, -FILLET_3_R), FILLET_3_R, 90, 90)
            Line((0, -FILLET_3_R), (0, 0))
            Line((0, 0), (FILLET_3_R, 0))
        make_face()
    extrude(amount=14, mode=Mode.SUBTRACT)
    with BuildSketch(Plane(origin=(2.5, -2.38, -15), x_dir=(0, -1, 0), z_dir=(0, 0, 1))) as fillet_3_piece_3:
        with BuildLine():
            CenterArc((FILLET_3_R, FILLET_3_R), FILLET_3_R, 180, 90)
            Line((0, FILLET_3_R), (0, 0))
            Line((0, 0), (FILLET_3_R, 0))
        make_face()
    extrude(amount=14, mode=Mode.SUBTRACT)
    with BuildSketch(Plane(origin=(2.5, 5.62, -25), x_dir=(1, 0, 0), z_dir=(0, 0, 1))) as fillet_3_piece_4:
        with BuildLine():
            CenterArc((FILLET_3_R, -FILLET_3_R), FILLET_3_R, 90, 90)
            Line((0, -FILLET_3_R), (0, 0))
            Line((0, 0), (FILLET_3_R, 0))
        make_face()
    extrude(amount=24, mode=Mode.SUBTRACT)

    # Скругление4
    fillet_4_edges = [part.edges().sort_by_distance(p)[0] for p in [
        (-23, 3, 3.5),
        (23, 3, 3.5),
        (23, -15, -18),
        (23, -13.242640687, 1.742640687),
        (-23, -15, -18),
        (-23, -13.242640687, 1.742640687),
    ]]
    fillet(fillet_4_edges, radius=FILLET_4_R)

    # Эскиз12 → Бобышка-Вытянуть4 (add)
    with BuildSketch(Plane(origin=(23, 0, 0), x_dir=(0, 0, -1), z_dir=(1, 0, 0))):
        with Locations((9.6, 5.87)):
            Rectangle(SKETCH_12_W, SKETCH_12_H)
        with Locations((8, -0.63)):
            Rectangle(SKETCH_12_W, SKETCH_12_H)
    extrude(amount=-EXTRUDE_4_DEPTH)

    # Эскиз13 → Бобышка-Вытянуть5 (add)
    with BuildSketch(Plane.ZY.offset(23)):
        with Locations((-8, 5.87)):
            Rectangle(SKETCH_13_W, SKETCH_13_H)
        with Locations((-9.6, -0.63)):
            Rectangle(SKETCH_13_W, SKETCH_13_H)
    extrude(amount=-EXTRUDE_5_DEPTH)

    # Эскиз14 → Вырез-Вытянуть9 (cut)
    with BuildSketch(Plane.XZ.offset(15)):
        with Locations((0, -8)):
            Rectangle(SKETCH_14_W, SKETCH_14_H)
    extrude(amount=-CUT_EXTRUDE_9_DEPTH, mode=Mode.SUBTRACT)

    # Скругление5
    fillet_5_edges = [part.edges().sort_by_distance(p)[0] for p in [
        (-2.5, -12.5, -8),
        (2.5, -12.5, -8),
    ]]
    fillet(fillet_5_edges, radius=FILLET_5_R)

    # Эскиз15 → Вырез-Вытянуть10 (cut)
    with BuildSketch(Plane.XZ.offset(12.5)):
        with Locations(Location((-19, -8, 0), (0, 0, 270))):
            Circle(SKETCH_15_R)
        with Locations(Location((19, -8, 0), (0, 0, 270))):
            Circle(SKETCH_15_R)
    extrude(amount=-CUT_EXTRUDE_10_DEPTH, mode=Mode.SUBTRACT)

    # Эскиз16 → Вырез-Вытянуть11 (cut)
    with BuildSketch(Plane.ZY.offset(23)):
        with Locations((-8, -6.3)):
            Rectangle(SKETCH_16_W, SKETCH_16_H)
    extrude(amount=-CUT_EXTRUDE_11_DEPTH, mode=Mode.SUBTRACT)

    # Эскиз17 → Вырез-Вытянуть12 (cut)
    with BuildSketch(Plane(origin=(23, 0, 0), x_dir=(0, 0, -1), z_dir=(1, 0, 0))):
        with Locations((8, -6.3)):
            Rectangle(SKETCH_17_W, SKETCH_17_H)
    extrude(amount=-CUT_EXTRUDE_12_DEPTH, mode=Mode.SUBTRACT)

    # Эскиз18 → Вырез-Вытянуть13 (cut)
    with BuildSketch(Plane(origin=(0, 15, 0), x_dir=(1, 0, 0), z_dir=(0, 1, 0))):
        with Locations(Location((8, 10, 0), (0, 0, 270))):
            Circle(SKETCH_18_R)
        with Locations(Location((-8, 10, 0), (0, 0, 90))):
            Circle(SKETCH_18_R)
        Polygon((3.75277675, 15.5), (1.876388375, 18.75), (-1.876388375, 18.75), (-3.75277675, 15.5), (-1.876388375, 12.25), (1.876388375, 12.25), align=None)
    extrude(amount=-CUT_EXTRUDE_13_DEPTH, mode=Mode.SUBTRACT)


solid = part.part
